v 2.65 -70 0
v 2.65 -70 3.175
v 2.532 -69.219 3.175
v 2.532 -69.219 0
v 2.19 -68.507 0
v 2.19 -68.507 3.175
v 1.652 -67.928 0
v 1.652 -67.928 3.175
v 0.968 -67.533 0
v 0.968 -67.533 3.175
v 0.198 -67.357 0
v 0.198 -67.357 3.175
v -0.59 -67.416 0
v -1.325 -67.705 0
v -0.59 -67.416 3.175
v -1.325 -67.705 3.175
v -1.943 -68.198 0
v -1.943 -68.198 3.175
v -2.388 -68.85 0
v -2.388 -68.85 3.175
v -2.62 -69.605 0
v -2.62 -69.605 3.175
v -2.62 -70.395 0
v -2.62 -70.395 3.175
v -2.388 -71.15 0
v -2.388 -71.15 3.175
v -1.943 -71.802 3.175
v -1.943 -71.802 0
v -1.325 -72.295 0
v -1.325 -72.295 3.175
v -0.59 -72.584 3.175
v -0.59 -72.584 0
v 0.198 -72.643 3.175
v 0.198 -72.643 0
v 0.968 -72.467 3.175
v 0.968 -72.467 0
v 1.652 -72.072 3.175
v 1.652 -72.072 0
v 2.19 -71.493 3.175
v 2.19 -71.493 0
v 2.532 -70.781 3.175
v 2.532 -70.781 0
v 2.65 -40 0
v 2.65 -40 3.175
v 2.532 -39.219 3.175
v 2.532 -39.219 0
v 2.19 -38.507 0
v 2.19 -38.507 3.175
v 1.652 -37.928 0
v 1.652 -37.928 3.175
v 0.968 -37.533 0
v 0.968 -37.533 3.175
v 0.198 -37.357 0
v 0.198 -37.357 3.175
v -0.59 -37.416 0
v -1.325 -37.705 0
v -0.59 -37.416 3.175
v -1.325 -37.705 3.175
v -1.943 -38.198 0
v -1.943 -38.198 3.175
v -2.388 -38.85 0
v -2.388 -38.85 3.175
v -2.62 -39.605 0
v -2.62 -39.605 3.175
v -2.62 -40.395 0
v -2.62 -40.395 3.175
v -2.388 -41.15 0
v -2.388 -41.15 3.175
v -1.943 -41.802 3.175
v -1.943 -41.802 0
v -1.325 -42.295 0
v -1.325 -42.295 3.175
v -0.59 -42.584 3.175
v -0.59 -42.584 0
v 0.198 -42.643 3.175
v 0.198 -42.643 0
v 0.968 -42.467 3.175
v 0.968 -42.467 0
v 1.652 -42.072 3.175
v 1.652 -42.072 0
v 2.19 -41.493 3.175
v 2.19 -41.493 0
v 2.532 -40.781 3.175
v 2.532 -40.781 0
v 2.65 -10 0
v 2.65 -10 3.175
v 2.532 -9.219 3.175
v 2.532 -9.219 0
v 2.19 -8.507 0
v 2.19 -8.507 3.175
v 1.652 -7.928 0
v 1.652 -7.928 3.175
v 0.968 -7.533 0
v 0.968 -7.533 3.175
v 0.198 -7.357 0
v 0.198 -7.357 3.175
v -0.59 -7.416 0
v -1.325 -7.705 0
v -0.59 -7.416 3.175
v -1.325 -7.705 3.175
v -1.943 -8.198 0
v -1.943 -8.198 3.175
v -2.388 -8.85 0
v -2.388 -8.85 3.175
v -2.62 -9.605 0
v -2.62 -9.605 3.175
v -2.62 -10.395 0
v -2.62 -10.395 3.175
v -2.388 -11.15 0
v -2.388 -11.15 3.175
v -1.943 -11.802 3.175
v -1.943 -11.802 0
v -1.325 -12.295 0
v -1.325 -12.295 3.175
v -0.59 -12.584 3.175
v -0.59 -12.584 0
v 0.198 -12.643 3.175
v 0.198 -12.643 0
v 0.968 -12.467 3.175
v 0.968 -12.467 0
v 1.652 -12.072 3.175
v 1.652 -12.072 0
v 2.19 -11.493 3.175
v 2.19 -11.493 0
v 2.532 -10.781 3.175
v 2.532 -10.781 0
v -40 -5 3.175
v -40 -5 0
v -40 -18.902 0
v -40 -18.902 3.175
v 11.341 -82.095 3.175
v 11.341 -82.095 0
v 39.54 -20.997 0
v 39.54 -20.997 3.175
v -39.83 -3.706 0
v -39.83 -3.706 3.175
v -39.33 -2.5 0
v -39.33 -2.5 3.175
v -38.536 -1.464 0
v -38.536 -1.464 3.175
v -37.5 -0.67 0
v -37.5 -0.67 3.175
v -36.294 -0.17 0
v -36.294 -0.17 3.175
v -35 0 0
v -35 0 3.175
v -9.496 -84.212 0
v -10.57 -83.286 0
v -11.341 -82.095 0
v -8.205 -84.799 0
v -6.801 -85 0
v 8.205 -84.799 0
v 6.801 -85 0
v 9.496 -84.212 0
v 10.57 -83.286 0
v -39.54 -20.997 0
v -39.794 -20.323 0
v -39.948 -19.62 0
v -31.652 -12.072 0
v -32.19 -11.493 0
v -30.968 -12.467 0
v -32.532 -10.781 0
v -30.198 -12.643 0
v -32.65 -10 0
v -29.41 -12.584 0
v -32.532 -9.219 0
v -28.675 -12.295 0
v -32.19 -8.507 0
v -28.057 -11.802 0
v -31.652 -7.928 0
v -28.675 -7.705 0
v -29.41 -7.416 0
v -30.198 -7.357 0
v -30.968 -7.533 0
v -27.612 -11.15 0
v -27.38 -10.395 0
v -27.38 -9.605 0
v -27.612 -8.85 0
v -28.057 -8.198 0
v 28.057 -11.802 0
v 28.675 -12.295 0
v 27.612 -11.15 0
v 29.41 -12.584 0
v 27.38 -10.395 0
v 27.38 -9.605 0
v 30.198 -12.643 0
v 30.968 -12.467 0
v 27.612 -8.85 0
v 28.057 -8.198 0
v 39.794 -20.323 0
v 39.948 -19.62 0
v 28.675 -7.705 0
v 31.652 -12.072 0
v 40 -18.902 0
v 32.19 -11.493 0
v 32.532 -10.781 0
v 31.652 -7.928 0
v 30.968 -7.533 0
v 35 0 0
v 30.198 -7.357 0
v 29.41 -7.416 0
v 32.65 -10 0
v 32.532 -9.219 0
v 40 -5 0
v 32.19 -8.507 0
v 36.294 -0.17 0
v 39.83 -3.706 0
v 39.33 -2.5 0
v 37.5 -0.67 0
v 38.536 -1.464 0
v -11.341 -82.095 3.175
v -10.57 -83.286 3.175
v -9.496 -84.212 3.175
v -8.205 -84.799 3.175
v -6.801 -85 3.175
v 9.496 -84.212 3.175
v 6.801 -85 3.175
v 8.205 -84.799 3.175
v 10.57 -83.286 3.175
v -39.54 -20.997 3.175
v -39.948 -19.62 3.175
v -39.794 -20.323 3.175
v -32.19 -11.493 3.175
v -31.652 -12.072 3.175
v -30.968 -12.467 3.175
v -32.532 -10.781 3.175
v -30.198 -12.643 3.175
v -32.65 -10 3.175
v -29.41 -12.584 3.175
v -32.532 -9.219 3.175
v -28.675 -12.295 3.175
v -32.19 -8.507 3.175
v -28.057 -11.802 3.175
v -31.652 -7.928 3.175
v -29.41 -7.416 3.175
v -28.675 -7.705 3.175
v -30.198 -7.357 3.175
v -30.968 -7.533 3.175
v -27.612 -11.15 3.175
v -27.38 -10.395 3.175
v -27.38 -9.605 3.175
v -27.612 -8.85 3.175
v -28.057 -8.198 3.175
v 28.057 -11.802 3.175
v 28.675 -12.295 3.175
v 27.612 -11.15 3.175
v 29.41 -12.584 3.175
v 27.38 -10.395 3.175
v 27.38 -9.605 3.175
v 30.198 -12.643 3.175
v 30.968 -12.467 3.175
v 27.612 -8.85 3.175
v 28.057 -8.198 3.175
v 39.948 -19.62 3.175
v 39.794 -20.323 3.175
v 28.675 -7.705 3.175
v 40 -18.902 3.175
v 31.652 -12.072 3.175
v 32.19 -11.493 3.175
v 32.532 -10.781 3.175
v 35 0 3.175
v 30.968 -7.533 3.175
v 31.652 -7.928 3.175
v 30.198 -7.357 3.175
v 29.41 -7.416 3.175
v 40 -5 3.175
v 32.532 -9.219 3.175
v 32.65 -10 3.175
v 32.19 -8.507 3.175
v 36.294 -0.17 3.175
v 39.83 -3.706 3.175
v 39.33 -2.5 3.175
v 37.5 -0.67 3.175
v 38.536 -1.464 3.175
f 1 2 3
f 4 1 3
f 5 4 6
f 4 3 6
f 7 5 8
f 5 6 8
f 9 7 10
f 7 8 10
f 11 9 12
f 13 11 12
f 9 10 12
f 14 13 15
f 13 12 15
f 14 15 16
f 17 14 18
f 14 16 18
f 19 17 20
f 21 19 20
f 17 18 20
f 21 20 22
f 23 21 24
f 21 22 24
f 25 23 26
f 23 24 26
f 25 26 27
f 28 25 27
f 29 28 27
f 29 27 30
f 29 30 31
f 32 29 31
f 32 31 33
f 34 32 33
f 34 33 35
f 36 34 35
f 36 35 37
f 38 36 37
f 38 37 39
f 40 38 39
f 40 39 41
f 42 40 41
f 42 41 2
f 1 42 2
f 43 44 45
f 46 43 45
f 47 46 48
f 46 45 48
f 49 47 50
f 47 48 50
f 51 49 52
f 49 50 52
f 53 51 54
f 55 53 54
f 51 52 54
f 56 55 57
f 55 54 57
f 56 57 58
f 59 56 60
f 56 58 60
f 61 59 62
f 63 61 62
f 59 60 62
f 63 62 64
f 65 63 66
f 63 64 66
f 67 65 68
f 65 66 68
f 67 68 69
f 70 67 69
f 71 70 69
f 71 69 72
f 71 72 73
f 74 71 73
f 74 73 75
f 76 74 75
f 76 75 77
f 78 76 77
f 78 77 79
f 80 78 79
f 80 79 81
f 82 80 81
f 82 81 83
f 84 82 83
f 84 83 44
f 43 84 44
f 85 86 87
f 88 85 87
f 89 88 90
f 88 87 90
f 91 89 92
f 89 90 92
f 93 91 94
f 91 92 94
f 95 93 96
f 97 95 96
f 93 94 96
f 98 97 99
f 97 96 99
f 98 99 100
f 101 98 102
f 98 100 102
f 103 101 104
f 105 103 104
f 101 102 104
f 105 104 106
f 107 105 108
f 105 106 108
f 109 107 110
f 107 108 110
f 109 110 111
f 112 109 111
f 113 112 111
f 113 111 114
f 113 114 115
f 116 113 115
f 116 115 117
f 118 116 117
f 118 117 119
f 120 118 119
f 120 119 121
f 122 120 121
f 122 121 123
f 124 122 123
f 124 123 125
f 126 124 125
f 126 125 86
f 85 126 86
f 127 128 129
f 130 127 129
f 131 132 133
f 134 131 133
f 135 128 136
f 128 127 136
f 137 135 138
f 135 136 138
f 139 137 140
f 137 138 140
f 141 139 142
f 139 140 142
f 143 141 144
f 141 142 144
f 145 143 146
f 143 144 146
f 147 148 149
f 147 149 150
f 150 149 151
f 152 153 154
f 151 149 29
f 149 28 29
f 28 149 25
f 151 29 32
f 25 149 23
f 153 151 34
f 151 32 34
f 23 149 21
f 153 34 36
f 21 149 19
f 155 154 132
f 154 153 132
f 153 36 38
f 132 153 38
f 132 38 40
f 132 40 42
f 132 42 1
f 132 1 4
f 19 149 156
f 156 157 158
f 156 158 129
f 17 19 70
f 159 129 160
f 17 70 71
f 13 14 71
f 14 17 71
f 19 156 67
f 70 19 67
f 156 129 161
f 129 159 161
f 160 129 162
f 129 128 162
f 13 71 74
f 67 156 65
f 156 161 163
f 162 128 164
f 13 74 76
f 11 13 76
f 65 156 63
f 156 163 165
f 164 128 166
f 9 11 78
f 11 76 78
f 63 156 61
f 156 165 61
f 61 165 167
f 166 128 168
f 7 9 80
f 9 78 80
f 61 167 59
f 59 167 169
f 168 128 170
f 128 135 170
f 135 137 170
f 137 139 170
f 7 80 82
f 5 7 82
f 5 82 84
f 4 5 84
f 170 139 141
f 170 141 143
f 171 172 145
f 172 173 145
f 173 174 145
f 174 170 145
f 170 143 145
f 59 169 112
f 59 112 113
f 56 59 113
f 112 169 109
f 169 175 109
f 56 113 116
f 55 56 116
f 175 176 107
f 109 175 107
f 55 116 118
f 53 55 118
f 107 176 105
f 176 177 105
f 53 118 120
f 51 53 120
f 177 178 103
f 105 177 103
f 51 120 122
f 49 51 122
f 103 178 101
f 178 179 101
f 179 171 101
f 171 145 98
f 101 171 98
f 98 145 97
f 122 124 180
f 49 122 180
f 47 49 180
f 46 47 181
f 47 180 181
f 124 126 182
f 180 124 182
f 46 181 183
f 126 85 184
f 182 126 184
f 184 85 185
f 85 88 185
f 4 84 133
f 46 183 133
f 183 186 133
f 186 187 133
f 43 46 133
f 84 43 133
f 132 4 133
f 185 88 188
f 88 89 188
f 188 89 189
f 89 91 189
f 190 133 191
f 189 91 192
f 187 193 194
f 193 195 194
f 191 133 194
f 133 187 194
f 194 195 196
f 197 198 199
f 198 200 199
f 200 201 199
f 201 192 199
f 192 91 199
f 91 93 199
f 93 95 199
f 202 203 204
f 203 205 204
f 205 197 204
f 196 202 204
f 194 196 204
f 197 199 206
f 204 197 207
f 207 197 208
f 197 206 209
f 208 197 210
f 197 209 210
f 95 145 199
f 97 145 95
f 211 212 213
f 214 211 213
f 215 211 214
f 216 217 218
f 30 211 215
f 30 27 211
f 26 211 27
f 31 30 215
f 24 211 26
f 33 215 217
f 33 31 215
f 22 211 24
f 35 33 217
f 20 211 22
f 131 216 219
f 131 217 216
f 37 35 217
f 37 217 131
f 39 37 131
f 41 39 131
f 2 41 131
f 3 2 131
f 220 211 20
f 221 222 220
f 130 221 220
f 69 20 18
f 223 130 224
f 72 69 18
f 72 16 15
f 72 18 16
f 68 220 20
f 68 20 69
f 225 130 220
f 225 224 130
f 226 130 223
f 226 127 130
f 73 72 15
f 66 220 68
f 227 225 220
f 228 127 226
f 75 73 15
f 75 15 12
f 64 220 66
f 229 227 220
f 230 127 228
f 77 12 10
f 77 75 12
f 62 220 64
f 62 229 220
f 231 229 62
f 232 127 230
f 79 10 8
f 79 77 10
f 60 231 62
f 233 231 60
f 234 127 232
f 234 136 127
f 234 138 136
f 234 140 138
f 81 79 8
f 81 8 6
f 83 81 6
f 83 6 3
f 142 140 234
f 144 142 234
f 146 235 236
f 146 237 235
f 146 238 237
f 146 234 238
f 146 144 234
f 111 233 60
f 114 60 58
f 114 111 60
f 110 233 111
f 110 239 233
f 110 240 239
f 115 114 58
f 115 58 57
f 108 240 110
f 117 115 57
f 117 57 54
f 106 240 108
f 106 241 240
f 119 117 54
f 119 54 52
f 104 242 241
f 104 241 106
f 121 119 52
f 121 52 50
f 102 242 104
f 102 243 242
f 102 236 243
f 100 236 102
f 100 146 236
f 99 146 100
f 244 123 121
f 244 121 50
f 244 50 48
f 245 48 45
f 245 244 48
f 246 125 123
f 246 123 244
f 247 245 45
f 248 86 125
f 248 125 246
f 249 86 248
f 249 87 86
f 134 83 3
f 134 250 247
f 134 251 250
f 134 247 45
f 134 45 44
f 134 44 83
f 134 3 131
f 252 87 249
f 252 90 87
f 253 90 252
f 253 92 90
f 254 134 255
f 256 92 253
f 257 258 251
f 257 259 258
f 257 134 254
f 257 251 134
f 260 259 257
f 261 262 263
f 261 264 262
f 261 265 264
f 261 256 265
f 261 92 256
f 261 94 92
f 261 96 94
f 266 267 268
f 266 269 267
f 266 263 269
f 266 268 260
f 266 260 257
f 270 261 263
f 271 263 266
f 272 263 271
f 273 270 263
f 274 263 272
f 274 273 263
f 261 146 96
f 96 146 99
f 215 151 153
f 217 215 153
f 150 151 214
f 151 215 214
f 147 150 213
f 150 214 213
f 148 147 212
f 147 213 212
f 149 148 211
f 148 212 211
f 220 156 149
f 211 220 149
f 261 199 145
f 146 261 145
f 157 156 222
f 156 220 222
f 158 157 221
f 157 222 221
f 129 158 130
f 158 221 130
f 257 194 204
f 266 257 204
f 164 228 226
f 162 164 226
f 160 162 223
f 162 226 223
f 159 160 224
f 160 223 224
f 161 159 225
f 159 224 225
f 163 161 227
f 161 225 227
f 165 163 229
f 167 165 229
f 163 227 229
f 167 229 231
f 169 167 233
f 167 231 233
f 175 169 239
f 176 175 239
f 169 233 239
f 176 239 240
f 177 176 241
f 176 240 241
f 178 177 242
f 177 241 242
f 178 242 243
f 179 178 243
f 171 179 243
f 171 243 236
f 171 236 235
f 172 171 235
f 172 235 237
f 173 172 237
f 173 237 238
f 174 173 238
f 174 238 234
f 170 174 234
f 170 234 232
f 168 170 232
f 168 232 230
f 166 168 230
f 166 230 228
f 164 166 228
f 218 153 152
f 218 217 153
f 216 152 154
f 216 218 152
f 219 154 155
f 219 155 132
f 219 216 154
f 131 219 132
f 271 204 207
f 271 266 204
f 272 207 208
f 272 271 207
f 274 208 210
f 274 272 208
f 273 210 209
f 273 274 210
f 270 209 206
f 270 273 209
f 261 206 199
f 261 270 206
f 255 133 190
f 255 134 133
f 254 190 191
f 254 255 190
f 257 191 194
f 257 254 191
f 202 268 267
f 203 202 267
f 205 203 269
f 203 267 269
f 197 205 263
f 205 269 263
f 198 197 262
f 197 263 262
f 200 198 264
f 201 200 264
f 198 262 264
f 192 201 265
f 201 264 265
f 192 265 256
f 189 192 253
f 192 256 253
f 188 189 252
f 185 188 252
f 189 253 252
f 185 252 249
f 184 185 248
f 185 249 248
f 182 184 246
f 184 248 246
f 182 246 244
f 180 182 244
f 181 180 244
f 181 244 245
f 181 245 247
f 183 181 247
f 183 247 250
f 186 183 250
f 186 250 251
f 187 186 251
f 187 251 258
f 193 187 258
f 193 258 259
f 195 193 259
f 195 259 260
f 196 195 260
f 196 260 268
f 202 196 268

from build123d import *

# Parameters (mm, degrees)
BOSS_EXTRUDE1_DEPTH = 3.175
SKETCH2_R           = 2.65
CUT_EXTRUDE1_DEPTH  = 94.99510958
FILLET1_R           = 5


with BuildPart() as part:
    # Sketch1 → Boss-Extrude1 (new body)
    with BuildSketch(Plane.XY):
        Polygon((-10, -85), (10, -85), (40, -20), (40, 0), (-40, 0), (-40, -20), align=None)
    extrude(amount=BOSS_EXTRUDE1_DEPTH)

    # Sketch2 → Cut-Extrude1 (cut, through all)
    with BuildSketch(Plane.XY.offset(3.175)):
        with Locations((0, -10)):
            Circle(SKETCH2_R)
        with Locations((30, -10)):
            Circle(SKETCH2_R)
        with Locations((0, -40)):
            Circle(SKETCH2_R)
        with Locations((0, -70)):
            Circle(SKETCH2_R)
        with Locations(Location((-30, -10, 0), (0, 0, 180))):
            Circle(SKETCH2_R)
    extrude(amount=-CUT_EXTRUDE1_DEPTH, mode=Mode.SUBTRACT)

    # Fillet1
    fillet1_edges = [part.edges().sort_by_distance(p)[0] for p in [
        (-40, -20, 1.5875),
        (-40, 0, 1.5875),
        (40, 0, 1.5875),
        (40, -20, 1.5875),
        (10, -85, 1.5875),
        (-10, -85, 1.5875),
    ]]
    fillet(fillet1_edges, radius=FILLET1_R)


solid = part.part
